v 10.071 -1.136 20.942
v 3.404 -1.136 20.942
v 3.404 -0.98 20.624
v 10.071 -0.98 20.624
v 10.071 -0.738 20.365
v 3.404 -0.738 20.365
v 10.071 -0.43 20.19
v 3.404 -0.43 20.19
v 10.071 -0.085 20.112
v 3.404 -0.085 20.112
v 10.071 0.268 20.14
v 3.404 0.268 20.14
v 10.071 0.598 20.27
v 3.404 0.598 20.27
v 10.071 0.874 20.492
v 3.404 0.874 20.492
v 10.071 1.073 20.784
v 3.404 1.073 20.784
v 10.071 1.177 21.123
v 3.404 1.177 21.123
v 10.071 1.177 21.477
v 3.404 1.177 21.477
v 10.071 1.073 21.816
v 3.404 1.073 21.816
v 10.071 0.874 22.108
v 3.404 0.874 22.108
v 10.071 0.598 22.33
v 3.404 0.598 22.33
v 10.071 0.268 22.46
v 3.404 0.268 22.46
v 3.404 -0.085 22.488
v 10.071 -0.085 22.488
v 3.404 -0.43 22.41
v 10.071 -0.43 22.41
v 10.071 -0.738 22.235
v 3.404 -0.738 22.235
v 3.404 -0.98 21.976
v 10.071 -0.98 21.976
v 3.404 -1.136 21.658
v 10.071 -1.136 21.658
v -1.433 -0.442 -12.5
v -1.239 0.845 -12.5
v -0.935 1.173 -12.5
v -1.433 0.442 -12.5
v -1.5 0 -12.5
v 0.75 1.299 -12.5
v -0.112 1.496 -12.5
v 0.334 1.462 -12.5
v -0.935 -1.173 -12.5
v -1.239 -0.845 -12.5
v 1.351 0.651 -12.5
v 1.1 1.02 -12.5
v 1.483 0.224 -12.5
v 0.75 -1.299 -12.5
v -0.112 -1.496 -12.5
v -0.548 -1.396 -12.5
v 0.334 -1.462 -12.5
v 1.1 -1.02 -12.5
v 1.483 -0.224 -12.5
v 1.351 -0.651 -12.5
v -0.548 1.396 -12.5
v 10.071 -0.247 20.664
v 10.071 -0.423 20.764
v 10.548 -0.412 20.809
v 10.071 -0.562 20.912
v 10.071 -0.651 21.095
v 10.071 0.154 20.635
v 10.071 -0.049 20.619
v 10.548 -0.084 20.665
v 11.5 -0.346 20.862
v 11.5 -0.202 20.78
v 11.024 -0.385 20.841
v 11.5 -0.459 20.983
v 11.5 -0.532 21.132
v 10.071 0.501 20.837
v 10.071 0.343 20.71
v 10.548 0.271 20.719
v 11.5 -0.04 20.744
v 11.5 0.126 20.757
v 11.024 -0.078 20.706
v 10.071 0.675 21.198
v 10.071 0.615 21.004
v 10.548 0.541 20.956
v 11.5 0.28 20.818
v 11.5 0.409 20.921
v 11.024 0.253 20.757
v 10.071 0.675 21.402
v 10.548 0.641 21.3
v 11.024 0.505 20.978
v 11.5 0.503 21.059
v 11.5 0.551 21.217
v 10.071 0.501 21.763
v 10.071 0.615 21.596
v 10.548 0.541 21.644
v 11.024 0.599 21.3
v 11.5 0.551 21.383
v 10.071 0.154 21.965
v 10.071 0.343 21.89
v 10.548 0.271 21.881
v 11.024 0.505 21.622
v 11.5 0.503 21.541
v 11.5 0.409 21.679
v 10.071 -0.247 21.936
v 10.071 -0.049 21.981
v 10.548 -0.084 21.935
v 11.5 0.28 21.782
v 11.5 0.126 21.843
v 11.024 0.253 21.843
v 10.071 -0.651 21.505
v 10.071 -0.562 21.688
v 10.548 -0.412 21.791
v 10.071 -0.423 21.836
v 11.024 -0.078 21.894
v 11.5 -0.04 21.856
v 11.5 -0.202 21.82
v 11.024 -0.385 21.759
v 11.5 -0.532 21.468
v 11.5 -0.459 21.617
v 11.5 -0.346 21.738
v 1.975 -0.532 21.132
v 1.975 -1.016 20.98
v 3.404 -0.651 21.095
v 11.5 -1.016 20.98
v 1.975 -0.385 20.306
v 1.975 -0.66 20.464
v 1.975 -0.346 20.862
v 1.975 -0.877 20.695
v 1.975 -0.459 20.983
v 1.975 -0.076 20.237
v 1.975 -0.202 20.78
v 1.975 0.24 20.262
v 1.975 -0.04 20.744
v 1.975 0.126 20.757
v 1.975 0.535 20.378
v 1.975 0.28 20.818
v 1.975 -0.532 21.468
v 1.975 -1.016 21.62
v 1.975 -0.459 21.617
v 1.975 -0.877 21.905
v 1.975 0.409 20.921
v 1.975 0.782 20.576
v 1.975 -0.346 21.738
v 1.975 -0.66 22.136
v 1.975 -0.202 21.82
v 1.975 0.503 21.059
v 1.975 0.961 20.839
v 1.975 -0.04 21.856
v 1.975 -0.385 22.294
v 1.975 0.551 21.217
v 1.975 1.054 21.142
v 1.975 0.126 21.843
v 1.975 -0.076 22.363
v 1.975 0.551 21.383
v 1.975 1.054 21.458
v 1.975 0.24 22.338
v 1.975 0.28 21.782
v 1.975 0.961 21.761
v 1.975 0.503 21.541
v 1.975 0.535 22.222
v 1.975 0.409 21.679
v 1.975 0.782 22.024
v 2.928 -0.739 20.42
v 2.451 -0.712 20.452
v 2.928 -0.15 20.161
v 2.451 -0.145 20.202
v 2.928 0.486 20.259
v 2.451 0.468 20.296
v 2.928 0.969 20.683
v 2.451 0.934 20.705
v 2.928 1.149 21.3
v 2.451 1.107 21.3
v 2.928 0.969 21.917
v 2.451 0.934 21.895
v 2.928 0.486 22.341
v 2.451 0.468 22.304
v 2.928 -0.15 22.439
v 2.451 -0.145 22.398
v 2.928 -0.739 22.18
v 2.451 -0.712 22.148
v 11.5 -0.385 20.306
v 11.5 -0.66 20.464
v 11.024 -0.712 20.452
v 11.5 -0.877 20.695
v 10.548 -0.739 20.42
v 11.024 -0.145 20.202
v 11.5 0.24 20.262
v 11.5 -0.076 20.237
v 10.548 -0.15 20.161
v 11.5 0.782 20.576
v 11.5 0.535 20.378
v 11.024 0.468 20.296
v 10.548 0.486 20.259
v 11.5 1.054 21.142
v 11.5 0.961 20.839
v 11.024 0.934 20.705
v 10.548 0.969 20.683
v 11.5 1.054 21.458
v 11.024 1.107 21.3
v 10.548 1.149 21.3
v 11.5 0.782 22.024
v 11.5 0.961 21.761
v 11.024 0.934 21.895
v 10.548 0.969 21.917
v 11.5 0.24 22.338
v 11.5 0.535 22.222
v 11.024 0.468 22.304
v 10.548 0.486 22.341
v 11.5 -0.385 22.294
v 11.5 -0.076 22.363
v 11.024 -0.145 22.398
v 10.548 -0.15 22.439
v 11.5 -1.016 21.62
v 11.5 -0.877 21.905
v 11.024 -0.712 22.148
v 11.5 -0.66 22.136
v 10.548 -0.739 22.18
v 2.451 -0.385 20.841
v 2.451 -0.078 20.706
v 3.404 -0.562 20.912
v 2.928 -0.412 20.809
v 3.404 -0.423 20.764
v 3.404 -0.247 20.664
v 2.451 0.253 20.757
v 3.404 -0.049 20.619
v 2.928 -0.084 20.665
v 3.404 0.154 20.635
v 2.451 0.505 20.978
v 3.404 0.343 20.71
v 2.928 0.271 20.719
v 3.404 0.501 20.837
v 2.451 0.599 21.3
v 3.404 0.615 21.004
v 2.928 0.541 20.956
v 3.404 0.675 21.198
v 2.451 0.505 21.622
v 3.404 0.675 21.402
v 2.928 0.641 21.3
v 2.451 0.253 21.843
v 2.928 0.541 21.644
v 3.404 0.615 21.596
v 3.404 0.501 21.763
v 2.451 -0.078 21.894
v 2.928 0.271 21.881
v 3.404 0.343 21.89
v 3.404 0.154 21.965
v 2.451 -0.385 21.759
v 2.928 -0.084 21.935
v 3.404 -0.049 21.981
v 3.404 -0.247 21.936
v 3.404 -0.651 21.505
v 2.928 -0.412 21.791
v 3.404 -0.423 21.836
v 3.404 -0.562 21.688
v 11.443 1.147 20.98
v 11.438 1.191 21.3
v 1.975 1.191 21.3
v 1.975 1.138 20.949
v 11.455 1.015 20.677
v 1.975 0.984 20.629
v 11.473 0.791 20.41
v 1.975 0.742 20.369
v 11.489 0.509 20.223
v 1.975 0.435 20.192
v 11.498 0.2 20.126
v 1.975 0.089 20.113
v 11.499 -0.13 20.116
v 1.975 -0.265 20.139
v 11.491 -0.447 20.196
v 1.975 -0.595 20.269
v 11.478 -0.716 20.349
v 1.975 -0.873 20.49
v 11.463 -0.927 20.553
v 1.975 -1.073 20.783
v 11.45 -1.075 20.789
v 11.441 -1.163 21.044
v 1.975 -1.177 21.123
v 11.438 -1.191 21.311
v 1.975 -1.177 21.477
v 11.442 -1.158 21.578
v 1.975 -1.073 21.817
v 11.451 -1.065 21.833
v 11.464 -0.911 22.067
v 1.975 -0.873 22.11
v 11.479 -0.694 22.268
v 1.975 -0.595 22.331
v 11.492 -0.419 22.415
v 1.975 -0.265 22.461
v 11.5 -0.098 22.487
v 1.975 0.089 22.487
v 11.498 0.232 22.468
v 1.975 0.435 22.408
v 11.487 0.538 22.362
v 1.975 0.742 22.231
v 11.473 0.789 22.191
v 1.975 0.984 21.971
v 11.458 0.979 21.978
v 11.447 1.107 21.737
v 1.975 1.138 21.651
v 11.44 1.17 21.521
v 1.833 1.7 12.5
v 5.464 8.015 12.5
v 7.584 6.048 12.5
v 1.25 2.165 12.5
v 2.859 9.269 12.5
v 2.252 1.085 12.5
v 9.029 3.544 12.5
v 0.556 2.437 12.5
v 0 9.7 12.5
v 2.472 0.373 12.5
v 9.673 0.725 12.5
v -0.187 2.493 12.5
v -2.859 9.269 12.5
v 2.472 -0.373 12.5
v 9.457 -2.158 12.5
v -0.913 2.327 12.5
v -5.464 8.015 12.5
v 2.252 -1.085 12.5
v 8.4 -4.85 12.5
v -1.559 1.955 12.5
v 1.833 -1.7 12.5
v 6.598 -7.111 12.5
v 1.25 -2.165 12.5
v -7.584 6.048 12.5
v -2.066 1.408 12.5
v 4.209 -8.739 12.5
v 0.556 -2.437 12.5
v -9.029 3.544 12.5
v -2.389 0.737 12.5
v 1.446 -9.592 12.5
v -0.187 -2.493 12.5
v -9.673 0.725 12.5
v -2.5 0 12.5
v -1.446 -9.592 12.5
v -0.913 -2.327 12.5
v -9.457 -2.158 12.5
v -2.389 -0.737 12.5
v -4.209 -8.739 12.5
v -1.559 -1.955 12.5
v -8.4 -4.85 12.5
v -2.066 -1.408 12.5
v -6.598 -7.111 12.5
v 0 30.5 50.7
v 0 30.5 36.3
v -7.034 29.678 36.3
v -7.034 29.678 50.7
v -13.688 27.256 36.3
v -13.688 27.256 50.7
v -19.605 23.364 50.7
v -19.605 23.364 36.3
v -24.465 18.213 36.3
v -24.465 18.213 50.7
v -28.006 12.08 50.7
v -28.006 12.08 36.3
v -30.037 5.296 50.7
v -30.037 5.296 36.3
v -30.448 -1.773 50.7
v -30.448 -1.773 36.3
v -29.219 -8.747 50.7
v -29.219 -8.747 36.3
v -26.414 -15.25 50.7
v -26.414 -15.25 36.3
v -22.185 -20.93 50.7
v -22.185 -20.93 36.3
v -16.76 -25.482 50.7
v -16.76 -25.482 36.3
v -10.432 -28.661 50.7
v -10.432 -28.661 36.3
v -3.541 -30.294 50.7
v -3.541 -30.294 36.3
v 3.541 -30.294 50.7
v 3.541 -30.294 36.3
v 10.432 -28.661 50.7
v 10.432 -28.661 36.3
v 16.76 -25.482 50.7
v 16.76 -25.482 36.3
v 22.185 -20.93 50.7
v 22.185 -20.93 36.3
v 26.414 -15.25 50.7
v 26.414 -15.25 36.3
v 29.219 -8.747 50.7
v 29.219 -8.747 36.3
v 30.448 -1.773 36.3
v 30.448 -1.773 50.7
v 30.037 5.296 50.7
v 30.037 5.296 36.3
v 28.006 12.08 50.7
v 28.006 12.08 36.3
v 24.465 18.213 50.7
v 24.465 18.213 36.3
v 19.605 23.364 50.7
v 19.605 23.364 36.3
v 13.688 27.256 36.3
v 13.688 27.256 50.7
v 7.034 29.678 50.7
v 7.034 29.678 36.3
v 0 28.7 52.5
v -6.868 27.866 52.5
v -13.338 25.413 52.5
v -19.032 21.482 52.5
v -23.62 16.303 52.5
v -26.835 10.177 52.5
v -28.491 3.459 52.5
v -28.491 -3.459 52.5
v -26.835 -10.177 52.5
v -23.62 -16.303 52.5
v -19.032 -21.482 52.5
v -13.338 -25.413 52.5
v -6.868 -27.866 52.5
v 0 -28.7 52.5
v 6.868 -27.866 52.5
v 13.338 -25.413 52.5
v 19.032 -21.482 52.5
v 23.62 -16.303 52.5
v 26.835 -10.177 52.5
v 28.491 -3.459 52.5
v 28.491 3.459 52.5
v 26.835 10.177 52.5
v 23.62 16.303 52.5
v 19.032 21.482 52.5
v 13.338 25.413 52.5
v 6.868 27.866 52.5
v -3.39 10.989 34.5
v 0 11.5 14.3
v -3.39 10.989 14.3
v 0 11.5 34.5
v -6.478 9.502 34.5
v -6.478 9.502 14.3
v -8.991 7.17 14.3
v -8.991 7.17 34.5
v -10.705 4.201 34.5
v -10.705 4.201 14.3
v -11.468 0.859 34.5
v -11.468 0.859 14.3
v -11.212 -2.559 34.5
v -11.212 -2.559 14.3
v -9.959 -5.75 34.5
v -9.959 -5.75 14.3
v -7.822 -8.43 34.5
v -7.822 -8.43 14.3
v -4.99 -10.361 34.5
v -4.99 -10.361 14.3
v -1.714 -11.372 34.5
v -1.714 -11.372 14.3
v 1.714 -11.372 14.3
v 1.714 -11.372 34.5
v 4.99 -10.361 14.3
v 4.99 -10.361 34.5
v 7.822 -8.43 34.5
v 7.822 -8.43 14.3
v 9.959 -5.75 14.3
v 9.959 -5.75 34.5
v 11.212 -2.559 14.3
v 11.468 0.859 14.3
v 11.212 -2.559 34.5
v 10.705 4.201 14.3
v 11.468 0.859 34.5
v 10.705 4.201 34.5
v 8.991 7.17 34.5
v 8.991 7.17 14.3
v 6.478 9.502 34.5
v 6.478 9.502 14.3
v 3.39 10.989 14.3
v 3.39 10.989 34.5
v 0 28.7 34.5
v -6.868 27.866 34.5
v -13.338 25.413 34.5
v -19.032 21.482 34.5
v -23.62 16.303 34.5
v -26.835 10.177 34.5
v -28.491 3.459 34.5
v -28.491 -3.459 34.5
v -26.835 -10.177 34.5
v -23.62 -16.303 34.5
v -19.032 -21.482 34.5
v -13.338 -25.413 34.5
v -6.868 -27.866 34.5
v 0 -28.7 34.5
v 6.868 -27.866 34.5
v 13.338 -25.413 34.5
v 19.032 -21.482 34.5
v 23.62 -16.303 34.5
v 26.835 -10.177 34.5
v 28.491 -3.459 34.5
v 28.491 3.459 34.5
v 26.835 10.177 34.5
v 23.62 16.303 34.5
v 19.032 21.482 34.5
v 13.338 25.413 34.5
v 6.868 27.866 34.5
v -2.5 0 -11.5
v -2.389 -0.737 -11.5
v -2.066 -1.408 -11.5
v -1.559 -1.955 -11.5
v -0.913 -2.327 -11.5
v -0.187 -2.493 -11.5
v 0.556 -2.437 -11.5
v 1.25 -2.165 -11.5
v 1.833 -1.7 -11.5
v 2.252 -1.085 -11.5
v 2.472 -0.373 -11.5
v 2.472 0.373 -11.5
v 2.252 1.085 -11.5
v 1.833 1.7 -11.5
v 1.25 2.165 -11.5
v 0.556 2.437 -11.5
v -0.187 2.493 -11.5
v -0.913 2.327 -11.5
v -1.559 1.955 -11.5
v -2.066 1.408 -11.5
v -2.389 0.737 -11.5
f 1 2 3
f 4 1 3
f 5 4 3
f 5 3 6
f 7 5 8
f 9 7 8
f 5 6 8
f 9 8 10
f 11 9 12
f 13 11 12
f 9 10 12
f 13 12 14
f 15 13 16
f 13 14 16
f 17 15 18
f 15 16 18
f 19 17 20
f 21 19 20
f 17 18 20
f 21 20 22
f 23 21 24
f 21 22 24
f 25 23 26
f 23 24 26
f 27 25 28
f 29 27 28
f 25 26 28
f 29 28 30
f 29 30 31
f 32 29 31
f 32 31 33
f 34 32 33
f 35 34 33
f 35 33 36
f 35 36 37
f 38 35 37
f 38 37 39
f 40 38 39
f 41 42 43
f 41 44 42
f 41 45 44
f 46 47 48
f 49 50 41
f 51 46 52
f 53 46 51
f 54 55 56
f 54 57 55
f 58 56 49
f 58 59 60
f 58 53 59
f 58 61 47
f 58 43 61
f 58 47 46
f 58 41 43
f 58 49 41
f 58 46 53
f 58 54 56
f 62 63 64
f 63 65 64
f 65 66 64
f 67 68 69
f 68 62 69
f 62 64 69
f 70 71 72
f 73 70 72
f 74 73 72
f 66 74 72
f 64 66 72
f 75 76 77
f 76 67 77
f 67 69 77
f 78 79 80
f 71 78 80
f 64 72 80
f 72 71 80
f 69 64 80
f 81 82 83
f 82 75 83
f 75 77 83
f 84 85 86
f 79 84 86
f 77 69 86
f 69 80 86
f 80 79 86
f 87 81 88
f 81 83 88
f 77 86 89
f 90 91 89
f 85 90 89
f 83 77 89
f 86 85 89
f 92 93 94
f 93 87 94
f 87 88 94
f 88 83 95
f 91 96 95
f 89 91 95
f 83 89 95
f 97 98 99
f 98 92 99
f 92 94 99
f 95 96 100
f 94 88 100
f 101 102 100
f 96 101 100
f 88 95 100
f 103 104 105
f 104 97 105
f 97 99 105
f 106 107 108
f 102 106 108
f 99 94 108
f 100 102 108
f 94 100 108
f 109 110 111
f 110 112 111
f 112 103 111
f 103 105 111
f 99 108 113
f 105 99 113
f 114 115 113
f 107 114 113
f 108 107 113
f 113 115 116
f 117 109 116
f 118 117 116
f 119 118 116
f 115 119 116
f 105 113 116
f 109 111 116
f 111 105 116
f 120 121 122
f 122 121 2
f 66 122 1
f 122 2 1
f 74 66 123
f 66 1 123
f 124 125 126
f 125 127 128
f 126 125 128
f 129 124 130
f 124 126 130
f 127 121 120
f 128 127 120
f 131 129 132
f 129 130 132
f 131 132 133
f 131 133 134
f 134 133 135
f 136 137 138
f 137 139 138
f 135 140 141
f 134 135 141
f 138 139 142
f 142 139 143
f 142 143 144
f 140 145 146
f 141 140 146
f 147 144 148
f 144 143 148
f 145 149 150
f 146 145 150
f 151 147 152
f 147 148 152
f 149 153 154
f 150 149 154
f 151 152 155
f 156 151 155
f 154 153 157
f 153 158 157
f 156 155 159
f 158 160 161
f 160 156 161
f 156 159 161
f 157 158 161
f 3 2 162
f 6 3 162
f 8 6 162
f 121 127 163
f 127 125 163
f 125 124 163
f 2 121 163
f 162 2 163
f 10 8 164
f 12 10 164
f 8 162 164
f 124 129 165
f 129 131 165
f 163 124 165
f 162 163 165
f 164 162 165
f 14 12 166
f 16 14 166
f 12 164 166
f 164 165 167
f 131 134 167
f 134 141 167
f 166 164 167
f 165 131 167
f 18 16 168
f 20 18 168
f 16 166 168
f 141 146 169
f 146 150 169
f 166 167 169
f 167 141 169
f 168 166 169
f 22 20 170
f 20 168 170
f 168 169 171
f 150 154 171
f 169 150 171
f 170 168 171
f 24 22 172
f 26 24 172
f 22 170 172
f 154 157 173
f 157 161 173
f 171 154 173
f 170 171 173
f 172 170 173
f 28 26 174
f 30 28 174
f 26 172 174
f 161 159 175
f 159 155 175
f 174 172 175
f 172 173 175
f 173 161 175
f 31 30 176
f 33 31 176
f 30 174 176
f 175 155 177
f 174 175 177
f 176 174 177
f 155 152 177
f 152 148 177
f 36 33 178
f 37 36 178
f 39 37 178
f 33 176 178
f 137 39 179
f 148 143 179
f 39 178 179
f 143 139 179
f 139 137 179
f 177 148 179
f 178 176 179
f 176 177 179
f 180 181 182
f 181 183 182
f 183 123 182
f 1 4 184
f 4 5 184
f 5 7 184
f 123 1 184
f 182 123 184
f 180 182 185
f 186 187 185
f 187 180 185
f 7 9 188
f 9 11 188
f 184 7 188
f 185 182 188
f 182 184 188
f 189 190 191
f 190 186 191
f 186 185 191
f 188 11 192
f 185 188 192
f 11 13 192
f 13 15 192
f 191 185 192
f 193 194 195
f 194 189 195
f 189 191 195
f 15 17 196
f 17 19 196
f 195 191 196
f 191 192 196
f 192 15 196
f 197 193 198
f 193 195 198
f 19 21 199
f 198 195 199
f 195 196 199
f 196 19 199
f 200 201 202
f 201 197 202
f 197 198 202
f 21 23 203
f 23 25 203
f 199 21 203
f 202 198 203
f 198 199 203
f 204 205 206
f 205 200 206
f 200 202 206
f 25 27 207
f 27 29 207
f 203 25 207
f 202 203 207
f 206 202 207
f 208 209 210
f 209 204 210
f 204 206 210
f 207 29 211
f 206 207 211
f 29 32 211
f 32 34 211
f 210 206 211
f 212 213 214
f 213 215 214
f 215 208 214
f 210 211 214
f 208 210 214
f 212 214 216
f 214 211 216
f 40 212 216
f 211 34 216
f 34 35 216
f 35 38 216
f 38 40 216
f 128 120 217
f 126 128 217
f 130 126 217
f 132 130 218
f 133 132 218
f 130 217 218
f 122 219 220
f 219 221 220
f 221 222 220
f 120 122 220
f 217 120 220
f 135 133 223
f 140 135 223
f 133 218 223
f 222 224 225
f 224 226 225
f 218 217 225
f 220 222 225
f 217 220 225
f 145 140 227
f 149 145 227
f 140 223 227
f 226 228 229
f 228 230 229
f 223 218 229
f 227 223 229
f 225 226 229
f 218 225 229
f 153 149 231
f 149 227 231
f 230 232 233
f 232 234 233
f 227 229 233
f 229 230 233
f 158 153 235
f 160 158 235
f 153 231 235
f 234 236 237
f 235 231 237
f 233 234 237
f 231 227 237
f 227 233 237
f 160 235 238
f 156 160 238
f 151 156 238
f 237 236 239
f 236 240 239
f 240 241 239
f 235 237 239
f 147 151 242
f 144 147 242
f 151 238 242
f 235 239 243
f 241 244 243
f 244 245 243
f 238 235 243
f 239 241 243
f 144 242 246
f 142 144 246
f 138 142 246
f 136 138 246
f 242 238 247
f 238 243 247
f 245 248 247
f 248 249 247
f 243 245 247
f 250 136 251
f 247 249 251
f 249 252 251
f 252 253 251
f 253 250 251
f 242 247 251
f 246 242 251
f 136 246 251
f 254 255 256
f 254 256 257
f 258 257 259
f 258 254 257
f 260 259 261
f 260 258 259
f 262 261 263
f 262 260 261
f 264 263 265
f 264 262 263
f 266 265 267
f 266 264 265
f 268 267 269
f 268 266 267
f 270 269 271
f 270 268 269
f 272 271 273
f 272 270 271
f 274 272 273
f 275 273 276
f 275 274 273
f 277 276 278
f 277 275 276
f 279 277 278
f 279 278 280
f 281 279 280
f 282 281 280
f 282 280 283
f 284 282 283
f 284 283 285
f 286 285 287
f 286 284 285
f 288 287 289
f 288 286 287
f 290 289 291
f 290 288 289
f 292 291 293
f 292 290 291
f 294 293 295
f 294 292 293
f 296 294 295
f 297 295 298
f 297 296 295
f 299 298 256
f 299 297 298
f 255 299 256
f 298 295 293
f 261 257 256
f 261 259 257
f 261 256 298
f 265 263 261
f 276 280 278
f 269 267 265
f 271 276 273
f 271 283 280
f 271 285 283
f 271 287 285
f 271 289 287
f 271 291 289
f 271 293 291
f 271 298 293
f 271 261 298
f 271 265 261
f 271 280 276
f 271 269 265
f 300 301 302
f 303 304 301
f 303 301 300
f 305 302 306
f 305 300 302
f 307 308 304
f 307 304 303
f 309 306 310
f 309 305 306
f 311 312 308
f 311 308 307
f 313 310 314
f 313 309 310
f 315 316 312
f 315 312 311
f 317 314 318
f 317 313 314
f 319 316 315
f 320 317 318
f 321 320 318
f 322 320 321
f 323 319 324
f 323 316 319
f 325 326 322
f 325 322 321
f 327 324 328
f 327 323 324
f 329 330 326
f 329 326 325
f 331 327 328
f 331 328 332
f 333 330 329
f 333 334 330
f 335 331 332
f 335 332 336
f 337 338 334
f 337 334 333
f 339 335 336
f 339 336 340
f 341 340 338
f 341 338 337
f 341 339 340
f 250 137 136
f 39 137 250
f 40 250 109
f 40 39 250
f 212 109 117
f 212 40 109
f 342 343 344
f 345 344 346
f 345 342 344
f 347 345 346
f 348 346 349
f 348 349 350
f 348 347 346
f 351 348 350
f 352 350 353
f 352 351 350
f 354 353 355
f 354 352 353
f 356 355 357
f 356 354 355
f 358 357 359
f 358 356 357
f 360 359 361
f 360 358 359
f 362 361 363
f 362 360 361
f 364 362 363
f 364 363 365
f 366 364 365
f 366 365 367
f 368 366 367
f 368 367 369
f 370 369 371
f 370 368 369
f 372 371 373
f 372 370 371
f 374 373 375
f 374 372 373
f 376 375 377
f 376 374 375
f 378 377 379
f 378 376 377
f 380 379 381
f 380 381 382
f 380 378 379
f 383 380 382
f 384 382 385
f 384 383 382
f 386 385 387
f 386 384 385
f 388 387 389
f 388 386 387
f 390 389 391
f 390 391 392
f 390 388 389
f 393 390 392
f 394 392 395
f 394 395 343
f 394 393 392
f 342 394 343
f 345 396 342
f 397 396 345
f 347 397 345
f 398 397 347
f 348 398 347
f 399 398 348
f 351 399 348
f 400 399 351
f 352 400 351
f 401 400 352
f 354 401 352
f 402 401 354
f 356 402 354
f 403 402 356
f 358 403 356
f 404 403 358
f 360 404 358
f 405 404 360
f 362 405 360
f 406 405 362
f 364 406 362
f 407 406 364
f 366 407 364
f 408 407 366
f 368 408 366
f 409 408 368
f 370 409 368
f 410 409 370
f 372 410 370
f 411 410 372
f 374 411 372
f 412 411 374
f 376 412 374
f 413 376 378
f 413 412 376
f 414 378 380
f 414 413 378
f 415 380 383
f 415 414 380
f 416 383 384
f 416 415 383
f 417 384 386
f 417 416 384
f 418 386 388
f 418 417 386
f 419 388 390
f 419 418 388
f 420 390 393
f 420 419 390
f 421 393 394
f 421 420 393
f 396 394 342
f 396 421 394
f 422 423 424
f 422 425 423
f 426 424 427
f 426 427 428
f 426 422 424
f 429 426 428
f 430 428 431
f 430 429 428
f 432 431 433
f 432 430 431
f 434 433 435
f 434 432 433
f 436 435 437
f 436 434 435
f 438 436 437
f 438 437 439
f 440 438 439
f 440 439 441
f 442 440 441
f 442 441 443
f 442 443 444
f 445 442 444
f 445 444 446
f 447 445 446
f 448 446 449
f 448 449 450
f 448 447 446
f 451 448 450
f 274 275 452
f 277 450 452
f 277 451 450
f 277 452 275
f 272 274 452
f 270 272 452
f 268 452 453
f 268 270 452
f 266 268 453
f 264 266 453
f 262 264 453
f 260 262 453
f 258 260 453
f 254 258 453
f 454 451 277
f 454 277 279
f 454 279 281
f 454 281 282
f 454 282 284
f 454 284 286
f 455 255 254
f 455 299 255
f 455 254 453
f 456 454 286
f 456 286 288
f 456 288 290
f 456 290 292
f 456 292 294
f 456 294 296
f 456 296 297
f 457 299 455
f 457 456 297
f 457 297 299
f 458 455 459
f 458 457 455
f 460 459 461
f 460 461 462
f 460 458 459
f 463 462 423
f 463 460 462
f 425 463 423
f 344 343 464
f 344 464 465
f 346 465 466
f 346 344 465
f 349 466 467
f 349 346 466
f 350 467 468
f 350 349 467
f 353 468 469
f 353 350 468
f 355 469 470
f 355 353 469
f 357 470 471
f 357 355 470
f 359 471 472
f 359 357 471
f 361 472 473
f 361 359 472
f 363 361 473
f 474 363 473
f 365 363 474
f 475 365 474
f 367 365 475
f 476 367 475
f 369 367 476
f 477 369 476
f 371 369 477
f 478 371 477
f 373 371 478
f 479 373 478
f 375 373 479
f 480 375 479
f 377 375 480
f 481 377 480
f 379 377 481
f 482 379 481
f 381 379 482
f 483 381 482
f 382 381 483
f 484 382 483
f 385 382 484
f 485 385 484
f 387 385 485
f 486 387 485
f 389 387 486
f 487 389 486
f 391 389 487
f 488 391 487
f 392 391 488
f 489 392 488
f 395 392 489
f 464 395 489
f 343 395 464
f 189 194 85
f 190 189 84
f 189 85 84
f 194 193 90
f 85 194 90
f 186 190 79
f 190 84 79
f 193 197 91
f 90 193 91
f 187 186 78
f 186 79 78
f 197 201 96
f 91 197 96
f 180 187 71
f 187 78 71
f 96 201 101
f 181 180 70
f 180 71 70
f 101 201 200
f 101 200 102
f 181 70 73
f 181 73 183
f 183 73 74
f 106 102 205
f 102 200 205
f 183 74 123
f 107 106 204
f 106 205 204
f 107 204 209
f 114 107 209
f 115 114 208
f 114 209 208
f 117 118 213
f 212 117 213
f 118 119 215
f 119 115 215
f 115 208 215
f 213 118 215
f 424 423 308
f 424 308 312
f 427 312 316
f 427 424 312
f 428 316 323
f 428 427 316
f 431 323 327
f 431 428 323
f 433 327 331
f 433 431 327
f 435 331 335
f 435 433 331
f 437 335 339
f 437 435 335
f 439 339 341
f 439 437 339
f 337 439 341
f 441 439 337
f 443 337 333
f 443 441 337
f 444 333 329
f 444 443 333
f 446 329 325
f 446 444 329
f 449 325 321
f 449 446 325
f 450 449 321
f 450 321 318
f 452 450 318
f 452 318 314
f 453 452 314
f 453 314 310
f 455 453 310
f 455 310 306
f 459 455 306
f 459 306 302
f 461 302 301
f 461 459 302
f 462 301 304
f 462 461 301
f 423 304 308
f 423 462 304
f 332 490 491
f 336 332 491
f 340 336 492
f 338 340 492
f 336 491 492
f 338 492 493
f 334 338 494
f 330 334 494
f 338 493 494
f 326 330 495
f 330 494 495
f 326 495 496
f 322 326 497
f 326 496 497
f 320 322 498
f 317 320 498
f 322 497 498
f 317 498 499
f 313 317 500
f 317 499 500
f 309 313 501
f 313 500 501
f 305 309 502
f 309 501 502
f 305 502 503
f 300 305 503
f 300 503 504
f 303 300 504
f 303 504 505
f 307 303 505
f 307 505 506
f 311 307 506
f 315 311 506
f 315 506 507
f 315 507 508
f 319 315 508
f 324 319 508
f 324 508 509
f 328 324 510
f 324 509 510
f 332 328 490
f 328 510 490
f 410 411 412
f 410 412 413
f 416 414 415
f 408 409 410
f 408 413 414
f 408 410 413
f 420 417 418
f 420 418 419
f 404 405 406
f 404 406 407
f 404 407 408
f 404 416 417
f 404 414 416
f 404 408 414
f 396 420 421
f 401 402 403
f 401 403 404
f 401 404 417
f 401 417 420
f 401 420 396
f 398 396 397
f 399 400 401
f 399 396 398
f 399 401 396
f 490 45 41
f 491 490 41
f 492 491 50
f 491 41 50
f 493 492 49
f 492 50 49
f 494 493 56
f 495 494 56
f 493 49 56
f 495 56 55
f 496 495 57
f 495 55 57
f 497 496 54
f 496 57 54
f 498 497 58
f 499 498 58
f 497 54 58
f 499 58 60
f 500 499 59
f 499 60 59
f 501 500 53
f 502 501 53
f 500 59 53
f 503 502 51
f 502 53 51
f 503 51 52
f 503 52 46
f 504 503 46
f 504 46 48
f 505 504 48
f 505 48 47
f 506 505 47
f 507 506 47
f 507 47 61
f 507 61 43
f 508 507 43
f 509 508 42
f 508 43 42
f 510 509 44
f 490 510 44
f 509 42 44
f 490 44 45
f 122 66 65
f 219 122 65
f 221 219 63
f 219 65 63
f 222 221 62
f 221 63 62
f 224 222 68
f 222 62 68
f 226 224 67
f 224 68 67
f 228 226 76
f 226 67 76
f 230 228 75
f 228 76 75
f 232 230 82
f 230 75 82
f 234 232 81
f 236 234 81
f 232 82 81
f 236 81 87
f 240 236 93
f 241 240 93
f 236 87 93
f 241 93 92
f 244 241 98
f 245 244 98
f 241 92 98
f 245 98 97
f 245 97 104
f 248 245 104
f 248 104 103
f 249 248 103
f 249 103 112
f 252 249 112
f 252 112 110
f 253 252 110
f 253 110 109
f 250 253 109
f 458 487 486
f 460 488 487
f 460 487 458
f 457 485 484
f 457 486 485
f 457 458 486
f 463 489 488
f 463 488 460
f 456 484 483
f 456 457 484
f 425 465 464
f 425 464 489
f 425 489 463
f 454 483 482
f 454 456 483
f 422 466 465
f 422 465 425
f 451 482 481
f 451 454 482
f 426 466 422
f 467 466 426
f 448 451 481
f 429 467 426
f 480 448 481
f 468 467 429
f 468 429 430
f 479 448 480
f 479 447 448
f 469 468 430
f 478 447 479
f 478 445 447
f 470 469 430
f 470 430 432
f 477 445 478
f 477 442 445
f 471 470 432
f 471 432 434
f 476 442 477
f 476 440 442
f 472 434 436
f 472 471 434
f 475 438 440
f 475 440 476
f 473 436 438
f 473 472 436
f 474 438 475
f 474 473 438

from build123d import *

# Parameters (mm, degrees)
SKETCH1_W      = 25
SKETCH1_H      = 2.5
CHAMFER1_SIZE  = 1
CHAMFER2_SIZE  = 1.8
SKETCH16_W     = 9.525
SKETCH16_H     = 1.190625
REVOLVE4_ANGLE = 325


with BuildPart() as part:
    # Sketch1 → Revolve1 (revolve)
    with BuildSketch(Plane(origin=(0, 0, 0), x_dir=(0, 0, -1), z_dir=(1, 0, 0))):
        with Locations((0, 1.25)):
            Rectangle(SKETCH1_W, SKETCH1_H)
    revolve(axis=Axis((0, 0, -12.5), (0, 0, 1)))

    # Sketch5 → Revolve3 (revolve)
    with BuildSketch(Plane(origin=(0, 0, 0), x_dir=(0, 0, -1), z_dir=(1, 0, 0))):
        Polygon((-12.5, 11.5), (-34.5, 11.5), (-34.5, 30.5), (-52.5, 30.5), (-52.5, 0), (-12.5, 0), align=None)
    revolve(axis=Axis((0, 0, 12.5), (0, 0, 1)))

    # Chamfer1
    chamfer1_edges = [part.edges().sort_by_distance(p)[0] for p in [
        (0, -2.5, -12.5),
    ]]
    chamfer(chamfer1_edges, length=CHAMFER1_SIZE)

    # Chamfer2
    chamfer2_edges = [part.edges().sort_by_distance(p)[0] for p in [
        (0, -30.5, 34.5),
        (0, -30.5, 52.5),
        (0, -11.5, 12.5),
    ]]
    chamfer(chamfer2_edges, length=CHAMFER2_SIZE)

    # Sketch16 → Cut-Revolve1 (revolve, cut)
    with BuildSketch(Plane.XY.offset(21.3)):
        with Locations((6.7375, 0.5953125)):
            Rectangle(SKETCH16_W, SKETCH16_H)
    revolve(axis=Axis((11.5, 0, 21.3), (-1, 0, 0)), mode=Mode.SUBTRACT)


with BuildPart() as body_2:
    # Sketch17 → Revolve4 (revolve, symmetric)
    with BuildSketch(Plane.XY.offset(21.3)) as revolve4_sk:
        Polygon((11.5, 1.065625572), (10.07125, 1.190625), (3.40375, 1.190625), (1.975, 1.065625572), (1.975, 0.557625572), (3.40375, 0.682625), (10.07125, 0.682625), (11.5, 0.557625572), align=None)
    revolve(axis=Axis((11.5, 0, 21.3), (-1, 0, 0)), revolution_arc=REVOLVE4_ANGLE / 2)
    revolve(revolve4_sk.sketch, axis=Axis((11.5, 0, 21.3), (1, 0, 0)), revolution_arc=REVOLVE4_ANGLE / 2)


solid = Compound([part.part, body_2.part])
